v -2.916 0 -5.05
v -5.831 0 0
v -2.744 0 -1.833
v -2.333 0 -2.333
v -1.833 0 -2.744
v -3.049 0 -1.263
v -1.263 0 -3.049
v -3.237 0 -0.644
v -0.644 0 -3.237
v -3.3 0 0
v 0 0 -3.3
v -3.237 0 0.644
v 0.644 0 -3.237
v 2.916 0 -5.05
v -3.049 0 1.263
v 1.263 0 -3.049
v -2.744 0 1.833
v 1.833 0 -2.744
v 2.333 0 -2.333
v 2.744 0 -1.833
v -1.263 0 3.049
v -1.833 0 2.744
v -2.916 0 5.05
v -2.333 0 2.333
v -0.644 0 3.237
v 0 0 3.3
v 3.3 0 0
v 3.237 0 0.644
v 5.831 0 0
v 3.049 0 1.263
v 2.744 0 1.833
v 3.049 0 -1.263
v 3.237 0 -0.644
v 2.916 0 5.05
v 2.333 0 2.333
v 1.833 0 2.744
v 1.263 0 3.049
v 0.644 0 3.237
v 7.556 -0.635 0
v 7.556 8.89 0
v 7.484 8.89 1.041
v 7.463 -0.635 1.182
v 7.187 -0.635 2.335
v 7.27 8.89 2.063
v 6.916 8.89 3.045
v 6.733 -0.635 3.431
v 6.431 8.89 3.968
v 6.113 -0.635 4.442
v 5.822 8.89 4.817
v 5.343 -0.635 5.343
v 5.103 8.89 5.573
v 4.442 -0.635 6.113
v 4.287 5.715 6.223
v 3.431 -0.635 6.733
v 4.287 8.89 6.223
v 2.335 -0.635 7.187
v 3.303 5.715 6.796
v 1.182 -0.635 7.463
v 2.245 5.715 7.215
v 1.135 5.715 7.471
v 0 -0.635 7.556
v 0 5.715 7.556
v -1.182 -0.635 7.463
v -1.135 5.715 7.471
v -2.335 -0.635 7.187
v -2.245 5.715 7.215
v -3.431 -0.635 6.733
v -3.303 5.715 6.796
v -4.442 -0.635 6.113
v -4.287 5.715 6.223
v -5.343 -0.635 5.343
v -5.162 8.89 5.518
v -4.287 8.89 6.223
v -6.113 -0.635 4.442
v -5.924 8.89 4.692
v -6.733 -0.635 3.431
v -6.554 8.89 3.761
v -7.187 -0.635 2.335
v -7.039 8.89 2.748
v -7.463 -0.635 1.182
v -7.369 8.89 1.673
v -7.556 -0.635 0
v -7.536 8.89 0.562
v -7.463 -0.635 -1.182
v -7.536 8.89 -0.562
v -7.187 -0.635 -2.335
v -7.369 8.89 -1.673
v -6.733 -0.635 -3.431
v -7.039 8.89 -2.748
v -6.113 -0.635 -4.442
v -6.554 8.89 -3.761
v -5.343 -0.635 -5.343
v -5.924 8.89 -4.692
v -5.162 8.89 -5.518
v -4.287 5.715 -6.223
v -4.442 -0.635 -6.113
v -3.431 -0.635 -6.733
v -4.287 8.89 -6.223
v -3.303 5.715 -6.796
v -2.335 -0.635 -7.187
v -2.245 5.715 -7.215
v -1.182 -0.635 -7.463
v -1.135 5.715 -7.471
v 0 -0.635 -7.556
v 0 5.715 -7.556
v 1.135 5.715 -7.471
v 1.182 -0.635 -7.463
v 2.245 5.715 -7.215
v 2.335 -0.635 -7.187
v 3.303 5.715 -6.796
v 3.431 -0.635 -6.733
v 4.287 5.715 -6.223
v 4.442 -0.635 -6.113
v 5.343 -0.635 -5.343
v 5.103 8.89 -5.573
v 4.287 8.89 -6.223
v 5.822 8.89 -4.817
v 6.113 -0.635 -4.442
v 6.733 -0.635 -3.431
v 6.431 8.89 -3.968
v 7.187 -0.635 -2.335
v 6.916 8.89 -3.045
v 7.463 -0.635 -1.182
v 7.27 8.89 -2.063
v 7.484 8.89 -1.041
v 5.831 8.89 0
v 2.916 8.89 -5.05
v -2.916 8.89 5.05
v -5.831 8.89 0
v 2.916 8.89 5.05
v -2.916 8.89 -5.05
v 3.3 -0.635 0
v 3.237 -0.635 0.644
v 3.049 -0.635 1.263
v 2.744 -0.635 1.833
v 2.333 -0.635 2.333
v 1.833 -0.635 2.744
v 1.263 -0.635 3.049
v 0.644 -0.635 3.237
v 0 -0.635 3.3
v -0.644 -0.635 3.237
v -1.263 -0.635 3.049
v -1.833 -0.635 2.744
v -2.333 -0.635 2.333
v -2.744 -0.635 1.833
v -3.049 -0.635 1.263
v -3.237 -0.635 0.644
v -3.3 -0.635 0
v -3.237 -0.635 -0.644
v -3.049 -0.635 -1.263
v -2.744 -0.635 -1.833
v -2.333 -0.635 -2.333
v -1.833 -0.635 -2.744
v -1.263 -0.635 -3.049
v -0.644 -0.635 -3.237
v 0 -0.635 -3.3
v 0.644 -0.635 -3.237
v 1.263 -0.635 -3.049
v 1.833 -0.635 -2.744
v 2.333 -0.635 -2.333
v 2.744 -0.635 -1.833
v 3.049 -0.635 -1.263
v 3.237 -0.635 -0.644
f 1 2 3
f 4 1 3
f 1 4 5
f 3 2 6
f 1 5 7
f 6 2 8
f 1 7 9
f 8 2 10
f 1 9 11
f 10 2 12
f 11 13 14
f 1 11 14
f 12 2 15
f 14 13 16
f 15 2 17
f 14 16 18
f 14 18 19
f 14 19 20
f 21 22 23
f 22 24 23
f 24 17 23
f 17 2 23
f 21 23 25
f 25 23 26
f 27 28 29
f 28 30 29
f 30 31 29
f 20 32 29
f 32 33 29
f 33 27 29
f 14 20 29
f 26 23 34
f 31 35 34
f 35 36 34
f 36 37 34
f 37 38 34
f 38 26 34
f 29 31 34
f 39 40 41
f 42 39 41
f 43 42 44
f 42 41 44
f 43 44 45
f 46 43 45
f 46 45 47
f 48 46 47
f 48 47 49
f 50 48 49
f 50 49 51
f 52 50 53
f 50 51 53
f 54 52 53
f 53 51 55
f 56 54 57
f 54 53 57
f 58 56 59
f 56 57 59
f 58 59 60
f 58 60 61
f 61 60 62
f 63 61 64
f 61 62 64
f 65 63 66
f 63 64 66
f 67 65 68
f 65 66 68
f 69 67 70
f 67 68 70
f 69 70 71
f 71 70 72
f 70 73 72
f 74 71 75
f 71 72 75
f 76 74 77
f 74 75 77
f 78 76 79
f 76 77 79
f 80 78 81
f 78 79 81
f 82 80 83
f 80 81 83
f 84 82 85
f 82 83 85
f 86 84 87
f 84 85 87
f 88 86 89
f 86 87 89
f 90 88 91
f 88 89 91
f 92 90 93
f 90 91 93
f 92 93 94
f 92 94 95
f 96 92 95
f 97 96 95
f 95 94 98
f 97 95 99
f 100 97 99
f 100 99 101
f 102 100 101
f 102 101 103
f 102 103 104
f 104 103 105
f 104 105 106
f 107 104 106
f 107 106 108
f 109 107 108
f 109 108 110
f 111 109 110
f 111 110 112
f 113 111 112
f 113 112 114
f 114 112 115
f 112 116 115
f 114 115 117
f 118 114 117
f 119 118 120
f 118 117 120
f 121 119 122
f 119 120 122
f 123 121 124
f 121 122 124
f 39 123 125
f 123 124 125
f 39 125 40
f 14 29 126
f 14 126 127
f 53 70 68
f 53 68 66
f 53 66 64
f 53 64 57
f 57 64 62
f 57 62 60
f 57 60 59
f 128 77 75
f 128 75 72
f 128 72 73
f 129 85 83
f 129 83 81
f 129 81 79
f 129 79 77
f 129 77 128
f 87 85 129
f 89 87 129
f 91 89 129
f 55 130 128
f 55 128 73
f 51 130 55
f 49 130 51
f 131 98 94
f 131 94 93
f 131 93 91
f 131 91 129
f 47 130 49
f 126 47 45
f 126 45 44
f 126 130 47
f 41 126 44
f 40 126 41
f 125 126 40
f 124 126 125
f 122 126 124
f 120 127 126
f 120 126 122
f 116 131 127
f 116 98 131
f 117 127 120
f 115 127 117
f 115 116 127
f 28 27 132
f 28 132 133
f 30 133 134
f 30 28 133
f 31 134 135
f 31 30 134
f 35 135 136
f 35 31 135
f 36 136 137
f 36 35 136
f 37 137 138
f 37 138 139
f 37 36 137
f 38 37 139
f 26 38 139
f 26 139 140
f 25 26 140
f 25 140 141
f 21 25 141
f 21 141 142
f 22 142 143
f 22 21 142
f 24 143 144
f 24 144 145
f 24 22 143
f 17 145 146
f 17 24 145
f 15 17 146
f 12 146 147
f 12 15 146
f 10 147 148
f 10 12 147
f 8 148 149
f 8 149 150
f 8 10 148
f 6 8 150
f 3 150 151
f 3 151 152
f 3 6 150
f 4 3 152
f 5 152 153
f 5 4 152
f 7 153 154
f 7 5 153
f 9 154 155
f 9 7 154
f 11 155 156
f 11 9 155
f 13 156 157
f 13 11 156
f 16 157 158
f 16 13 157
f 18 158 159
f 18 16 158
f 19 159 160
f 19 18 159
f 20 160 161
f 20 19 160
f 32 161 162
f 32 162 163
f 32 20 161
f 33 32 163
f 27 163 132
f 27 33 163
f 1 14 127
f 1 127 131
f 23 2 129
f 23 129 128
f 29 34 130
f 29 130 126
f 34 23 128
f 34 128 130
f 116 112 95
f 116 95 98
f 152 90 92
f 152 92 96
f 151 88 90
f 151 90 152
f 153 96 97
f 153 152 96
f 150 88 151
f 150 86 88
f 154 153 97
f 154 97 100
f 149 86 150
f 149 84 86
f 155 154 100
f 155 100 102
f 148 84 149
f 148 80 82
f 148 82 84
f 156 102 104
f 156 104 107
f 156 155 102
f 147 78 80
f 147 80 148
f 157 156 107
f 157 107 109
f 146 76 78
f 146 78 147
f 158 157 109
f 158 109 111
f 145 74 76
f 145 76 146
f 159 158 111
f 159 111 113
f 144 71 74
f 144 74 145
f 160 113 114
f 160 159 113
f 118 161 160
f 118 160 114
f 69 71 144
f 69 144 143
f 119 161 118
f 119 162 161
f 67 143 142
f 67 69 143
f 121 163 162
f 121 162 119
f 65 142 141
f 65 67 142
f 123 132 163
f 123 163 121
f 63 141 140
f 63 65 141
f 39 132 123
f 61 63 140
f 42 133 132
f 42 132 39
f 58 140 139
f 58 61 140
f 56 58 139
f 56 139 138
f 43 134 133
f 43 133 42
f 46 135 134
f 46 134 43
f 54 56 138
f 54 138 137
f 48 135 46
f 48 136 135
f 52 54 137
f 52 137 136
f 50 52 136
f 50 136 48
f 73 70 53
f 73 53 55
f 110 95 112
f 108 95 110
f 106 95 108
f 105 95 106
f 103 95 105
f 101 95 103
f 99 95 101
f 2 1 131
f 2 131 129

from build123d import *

# Parameters (mm, degrees)
SKETCH1_R               = 7.5565
BOSS_EXTRUDE1_DEPTH     = 8.89
SKETCH2_R               = 7.5565
SKETCH2_R_2             = 3.3
BOSS_EXTRUDE2_DEPTH     = 0.635
SKETCH3_W               = 1.979009817
SKETCH3_H               = 3.81
SKETCH3_W_2             = 2.256055482
CUT_EXTRUDE1_DEPTH      = 8.5565
CUT_EXTRUDE1_DEPTH_BACK = 8.5565


with BuildPart() as part:
    # Sketch1 → Boss-Extrude1 (new body)
    with BuildSketch(Plane(origin=(0, 0, 0), x_dir=(1, 0, 0), z_dir=(0, 1, 0))):
        Circle(SKETCH1_R)
        Polygon((-2.915618859, 5.05), (-5.831237719, 0), (-2.915618859, -5.05), (2.915618859, -5.05), (5.831237719, 0), (2.915618859, 5.05), align=None, mode=Mode.SUBTRACT)
    extrude(amount=BOSS_EXTRUDE1_DEPTH)

    # Sketch2 → Boss-Extrude2 (add)
    with BuildSketch(Plane.XZ):
        Circle(SKETCH2_R)
        Circle(SKETCH2_R_2, mode=Mode.SUBTRACT)
    extrude(amount=BOSS_EXTRUDE2_DEPTH)

    # Sketch3 → Cut-Extrude1 (cut, two sides)
    with BuildSketch(Plane(origin=(0, 0, 0), x_dir=(0, 0, -1), z_dir=(1, 0, 0))) as cut_extrude1_sk:
        with Locations((-7.212504909, 7.62)):
            Rectangle(SKETCH3_W, SKETCH3_H)
        with Locations((7.351027741, 7.62)):
            Rectangle(SKETCH3_W_2, SKETCH3_H)
    extrude(amount=CUT_EXTRUDE1_DEPTH, mode=Mode.SUBTRACT)
    extrude(cut_extrude1_sk.sketch, amount=-CUT_EXTRUDE1_DEPTH_BACK, mode=Mode.SUBTRACT)


solid = part.part
